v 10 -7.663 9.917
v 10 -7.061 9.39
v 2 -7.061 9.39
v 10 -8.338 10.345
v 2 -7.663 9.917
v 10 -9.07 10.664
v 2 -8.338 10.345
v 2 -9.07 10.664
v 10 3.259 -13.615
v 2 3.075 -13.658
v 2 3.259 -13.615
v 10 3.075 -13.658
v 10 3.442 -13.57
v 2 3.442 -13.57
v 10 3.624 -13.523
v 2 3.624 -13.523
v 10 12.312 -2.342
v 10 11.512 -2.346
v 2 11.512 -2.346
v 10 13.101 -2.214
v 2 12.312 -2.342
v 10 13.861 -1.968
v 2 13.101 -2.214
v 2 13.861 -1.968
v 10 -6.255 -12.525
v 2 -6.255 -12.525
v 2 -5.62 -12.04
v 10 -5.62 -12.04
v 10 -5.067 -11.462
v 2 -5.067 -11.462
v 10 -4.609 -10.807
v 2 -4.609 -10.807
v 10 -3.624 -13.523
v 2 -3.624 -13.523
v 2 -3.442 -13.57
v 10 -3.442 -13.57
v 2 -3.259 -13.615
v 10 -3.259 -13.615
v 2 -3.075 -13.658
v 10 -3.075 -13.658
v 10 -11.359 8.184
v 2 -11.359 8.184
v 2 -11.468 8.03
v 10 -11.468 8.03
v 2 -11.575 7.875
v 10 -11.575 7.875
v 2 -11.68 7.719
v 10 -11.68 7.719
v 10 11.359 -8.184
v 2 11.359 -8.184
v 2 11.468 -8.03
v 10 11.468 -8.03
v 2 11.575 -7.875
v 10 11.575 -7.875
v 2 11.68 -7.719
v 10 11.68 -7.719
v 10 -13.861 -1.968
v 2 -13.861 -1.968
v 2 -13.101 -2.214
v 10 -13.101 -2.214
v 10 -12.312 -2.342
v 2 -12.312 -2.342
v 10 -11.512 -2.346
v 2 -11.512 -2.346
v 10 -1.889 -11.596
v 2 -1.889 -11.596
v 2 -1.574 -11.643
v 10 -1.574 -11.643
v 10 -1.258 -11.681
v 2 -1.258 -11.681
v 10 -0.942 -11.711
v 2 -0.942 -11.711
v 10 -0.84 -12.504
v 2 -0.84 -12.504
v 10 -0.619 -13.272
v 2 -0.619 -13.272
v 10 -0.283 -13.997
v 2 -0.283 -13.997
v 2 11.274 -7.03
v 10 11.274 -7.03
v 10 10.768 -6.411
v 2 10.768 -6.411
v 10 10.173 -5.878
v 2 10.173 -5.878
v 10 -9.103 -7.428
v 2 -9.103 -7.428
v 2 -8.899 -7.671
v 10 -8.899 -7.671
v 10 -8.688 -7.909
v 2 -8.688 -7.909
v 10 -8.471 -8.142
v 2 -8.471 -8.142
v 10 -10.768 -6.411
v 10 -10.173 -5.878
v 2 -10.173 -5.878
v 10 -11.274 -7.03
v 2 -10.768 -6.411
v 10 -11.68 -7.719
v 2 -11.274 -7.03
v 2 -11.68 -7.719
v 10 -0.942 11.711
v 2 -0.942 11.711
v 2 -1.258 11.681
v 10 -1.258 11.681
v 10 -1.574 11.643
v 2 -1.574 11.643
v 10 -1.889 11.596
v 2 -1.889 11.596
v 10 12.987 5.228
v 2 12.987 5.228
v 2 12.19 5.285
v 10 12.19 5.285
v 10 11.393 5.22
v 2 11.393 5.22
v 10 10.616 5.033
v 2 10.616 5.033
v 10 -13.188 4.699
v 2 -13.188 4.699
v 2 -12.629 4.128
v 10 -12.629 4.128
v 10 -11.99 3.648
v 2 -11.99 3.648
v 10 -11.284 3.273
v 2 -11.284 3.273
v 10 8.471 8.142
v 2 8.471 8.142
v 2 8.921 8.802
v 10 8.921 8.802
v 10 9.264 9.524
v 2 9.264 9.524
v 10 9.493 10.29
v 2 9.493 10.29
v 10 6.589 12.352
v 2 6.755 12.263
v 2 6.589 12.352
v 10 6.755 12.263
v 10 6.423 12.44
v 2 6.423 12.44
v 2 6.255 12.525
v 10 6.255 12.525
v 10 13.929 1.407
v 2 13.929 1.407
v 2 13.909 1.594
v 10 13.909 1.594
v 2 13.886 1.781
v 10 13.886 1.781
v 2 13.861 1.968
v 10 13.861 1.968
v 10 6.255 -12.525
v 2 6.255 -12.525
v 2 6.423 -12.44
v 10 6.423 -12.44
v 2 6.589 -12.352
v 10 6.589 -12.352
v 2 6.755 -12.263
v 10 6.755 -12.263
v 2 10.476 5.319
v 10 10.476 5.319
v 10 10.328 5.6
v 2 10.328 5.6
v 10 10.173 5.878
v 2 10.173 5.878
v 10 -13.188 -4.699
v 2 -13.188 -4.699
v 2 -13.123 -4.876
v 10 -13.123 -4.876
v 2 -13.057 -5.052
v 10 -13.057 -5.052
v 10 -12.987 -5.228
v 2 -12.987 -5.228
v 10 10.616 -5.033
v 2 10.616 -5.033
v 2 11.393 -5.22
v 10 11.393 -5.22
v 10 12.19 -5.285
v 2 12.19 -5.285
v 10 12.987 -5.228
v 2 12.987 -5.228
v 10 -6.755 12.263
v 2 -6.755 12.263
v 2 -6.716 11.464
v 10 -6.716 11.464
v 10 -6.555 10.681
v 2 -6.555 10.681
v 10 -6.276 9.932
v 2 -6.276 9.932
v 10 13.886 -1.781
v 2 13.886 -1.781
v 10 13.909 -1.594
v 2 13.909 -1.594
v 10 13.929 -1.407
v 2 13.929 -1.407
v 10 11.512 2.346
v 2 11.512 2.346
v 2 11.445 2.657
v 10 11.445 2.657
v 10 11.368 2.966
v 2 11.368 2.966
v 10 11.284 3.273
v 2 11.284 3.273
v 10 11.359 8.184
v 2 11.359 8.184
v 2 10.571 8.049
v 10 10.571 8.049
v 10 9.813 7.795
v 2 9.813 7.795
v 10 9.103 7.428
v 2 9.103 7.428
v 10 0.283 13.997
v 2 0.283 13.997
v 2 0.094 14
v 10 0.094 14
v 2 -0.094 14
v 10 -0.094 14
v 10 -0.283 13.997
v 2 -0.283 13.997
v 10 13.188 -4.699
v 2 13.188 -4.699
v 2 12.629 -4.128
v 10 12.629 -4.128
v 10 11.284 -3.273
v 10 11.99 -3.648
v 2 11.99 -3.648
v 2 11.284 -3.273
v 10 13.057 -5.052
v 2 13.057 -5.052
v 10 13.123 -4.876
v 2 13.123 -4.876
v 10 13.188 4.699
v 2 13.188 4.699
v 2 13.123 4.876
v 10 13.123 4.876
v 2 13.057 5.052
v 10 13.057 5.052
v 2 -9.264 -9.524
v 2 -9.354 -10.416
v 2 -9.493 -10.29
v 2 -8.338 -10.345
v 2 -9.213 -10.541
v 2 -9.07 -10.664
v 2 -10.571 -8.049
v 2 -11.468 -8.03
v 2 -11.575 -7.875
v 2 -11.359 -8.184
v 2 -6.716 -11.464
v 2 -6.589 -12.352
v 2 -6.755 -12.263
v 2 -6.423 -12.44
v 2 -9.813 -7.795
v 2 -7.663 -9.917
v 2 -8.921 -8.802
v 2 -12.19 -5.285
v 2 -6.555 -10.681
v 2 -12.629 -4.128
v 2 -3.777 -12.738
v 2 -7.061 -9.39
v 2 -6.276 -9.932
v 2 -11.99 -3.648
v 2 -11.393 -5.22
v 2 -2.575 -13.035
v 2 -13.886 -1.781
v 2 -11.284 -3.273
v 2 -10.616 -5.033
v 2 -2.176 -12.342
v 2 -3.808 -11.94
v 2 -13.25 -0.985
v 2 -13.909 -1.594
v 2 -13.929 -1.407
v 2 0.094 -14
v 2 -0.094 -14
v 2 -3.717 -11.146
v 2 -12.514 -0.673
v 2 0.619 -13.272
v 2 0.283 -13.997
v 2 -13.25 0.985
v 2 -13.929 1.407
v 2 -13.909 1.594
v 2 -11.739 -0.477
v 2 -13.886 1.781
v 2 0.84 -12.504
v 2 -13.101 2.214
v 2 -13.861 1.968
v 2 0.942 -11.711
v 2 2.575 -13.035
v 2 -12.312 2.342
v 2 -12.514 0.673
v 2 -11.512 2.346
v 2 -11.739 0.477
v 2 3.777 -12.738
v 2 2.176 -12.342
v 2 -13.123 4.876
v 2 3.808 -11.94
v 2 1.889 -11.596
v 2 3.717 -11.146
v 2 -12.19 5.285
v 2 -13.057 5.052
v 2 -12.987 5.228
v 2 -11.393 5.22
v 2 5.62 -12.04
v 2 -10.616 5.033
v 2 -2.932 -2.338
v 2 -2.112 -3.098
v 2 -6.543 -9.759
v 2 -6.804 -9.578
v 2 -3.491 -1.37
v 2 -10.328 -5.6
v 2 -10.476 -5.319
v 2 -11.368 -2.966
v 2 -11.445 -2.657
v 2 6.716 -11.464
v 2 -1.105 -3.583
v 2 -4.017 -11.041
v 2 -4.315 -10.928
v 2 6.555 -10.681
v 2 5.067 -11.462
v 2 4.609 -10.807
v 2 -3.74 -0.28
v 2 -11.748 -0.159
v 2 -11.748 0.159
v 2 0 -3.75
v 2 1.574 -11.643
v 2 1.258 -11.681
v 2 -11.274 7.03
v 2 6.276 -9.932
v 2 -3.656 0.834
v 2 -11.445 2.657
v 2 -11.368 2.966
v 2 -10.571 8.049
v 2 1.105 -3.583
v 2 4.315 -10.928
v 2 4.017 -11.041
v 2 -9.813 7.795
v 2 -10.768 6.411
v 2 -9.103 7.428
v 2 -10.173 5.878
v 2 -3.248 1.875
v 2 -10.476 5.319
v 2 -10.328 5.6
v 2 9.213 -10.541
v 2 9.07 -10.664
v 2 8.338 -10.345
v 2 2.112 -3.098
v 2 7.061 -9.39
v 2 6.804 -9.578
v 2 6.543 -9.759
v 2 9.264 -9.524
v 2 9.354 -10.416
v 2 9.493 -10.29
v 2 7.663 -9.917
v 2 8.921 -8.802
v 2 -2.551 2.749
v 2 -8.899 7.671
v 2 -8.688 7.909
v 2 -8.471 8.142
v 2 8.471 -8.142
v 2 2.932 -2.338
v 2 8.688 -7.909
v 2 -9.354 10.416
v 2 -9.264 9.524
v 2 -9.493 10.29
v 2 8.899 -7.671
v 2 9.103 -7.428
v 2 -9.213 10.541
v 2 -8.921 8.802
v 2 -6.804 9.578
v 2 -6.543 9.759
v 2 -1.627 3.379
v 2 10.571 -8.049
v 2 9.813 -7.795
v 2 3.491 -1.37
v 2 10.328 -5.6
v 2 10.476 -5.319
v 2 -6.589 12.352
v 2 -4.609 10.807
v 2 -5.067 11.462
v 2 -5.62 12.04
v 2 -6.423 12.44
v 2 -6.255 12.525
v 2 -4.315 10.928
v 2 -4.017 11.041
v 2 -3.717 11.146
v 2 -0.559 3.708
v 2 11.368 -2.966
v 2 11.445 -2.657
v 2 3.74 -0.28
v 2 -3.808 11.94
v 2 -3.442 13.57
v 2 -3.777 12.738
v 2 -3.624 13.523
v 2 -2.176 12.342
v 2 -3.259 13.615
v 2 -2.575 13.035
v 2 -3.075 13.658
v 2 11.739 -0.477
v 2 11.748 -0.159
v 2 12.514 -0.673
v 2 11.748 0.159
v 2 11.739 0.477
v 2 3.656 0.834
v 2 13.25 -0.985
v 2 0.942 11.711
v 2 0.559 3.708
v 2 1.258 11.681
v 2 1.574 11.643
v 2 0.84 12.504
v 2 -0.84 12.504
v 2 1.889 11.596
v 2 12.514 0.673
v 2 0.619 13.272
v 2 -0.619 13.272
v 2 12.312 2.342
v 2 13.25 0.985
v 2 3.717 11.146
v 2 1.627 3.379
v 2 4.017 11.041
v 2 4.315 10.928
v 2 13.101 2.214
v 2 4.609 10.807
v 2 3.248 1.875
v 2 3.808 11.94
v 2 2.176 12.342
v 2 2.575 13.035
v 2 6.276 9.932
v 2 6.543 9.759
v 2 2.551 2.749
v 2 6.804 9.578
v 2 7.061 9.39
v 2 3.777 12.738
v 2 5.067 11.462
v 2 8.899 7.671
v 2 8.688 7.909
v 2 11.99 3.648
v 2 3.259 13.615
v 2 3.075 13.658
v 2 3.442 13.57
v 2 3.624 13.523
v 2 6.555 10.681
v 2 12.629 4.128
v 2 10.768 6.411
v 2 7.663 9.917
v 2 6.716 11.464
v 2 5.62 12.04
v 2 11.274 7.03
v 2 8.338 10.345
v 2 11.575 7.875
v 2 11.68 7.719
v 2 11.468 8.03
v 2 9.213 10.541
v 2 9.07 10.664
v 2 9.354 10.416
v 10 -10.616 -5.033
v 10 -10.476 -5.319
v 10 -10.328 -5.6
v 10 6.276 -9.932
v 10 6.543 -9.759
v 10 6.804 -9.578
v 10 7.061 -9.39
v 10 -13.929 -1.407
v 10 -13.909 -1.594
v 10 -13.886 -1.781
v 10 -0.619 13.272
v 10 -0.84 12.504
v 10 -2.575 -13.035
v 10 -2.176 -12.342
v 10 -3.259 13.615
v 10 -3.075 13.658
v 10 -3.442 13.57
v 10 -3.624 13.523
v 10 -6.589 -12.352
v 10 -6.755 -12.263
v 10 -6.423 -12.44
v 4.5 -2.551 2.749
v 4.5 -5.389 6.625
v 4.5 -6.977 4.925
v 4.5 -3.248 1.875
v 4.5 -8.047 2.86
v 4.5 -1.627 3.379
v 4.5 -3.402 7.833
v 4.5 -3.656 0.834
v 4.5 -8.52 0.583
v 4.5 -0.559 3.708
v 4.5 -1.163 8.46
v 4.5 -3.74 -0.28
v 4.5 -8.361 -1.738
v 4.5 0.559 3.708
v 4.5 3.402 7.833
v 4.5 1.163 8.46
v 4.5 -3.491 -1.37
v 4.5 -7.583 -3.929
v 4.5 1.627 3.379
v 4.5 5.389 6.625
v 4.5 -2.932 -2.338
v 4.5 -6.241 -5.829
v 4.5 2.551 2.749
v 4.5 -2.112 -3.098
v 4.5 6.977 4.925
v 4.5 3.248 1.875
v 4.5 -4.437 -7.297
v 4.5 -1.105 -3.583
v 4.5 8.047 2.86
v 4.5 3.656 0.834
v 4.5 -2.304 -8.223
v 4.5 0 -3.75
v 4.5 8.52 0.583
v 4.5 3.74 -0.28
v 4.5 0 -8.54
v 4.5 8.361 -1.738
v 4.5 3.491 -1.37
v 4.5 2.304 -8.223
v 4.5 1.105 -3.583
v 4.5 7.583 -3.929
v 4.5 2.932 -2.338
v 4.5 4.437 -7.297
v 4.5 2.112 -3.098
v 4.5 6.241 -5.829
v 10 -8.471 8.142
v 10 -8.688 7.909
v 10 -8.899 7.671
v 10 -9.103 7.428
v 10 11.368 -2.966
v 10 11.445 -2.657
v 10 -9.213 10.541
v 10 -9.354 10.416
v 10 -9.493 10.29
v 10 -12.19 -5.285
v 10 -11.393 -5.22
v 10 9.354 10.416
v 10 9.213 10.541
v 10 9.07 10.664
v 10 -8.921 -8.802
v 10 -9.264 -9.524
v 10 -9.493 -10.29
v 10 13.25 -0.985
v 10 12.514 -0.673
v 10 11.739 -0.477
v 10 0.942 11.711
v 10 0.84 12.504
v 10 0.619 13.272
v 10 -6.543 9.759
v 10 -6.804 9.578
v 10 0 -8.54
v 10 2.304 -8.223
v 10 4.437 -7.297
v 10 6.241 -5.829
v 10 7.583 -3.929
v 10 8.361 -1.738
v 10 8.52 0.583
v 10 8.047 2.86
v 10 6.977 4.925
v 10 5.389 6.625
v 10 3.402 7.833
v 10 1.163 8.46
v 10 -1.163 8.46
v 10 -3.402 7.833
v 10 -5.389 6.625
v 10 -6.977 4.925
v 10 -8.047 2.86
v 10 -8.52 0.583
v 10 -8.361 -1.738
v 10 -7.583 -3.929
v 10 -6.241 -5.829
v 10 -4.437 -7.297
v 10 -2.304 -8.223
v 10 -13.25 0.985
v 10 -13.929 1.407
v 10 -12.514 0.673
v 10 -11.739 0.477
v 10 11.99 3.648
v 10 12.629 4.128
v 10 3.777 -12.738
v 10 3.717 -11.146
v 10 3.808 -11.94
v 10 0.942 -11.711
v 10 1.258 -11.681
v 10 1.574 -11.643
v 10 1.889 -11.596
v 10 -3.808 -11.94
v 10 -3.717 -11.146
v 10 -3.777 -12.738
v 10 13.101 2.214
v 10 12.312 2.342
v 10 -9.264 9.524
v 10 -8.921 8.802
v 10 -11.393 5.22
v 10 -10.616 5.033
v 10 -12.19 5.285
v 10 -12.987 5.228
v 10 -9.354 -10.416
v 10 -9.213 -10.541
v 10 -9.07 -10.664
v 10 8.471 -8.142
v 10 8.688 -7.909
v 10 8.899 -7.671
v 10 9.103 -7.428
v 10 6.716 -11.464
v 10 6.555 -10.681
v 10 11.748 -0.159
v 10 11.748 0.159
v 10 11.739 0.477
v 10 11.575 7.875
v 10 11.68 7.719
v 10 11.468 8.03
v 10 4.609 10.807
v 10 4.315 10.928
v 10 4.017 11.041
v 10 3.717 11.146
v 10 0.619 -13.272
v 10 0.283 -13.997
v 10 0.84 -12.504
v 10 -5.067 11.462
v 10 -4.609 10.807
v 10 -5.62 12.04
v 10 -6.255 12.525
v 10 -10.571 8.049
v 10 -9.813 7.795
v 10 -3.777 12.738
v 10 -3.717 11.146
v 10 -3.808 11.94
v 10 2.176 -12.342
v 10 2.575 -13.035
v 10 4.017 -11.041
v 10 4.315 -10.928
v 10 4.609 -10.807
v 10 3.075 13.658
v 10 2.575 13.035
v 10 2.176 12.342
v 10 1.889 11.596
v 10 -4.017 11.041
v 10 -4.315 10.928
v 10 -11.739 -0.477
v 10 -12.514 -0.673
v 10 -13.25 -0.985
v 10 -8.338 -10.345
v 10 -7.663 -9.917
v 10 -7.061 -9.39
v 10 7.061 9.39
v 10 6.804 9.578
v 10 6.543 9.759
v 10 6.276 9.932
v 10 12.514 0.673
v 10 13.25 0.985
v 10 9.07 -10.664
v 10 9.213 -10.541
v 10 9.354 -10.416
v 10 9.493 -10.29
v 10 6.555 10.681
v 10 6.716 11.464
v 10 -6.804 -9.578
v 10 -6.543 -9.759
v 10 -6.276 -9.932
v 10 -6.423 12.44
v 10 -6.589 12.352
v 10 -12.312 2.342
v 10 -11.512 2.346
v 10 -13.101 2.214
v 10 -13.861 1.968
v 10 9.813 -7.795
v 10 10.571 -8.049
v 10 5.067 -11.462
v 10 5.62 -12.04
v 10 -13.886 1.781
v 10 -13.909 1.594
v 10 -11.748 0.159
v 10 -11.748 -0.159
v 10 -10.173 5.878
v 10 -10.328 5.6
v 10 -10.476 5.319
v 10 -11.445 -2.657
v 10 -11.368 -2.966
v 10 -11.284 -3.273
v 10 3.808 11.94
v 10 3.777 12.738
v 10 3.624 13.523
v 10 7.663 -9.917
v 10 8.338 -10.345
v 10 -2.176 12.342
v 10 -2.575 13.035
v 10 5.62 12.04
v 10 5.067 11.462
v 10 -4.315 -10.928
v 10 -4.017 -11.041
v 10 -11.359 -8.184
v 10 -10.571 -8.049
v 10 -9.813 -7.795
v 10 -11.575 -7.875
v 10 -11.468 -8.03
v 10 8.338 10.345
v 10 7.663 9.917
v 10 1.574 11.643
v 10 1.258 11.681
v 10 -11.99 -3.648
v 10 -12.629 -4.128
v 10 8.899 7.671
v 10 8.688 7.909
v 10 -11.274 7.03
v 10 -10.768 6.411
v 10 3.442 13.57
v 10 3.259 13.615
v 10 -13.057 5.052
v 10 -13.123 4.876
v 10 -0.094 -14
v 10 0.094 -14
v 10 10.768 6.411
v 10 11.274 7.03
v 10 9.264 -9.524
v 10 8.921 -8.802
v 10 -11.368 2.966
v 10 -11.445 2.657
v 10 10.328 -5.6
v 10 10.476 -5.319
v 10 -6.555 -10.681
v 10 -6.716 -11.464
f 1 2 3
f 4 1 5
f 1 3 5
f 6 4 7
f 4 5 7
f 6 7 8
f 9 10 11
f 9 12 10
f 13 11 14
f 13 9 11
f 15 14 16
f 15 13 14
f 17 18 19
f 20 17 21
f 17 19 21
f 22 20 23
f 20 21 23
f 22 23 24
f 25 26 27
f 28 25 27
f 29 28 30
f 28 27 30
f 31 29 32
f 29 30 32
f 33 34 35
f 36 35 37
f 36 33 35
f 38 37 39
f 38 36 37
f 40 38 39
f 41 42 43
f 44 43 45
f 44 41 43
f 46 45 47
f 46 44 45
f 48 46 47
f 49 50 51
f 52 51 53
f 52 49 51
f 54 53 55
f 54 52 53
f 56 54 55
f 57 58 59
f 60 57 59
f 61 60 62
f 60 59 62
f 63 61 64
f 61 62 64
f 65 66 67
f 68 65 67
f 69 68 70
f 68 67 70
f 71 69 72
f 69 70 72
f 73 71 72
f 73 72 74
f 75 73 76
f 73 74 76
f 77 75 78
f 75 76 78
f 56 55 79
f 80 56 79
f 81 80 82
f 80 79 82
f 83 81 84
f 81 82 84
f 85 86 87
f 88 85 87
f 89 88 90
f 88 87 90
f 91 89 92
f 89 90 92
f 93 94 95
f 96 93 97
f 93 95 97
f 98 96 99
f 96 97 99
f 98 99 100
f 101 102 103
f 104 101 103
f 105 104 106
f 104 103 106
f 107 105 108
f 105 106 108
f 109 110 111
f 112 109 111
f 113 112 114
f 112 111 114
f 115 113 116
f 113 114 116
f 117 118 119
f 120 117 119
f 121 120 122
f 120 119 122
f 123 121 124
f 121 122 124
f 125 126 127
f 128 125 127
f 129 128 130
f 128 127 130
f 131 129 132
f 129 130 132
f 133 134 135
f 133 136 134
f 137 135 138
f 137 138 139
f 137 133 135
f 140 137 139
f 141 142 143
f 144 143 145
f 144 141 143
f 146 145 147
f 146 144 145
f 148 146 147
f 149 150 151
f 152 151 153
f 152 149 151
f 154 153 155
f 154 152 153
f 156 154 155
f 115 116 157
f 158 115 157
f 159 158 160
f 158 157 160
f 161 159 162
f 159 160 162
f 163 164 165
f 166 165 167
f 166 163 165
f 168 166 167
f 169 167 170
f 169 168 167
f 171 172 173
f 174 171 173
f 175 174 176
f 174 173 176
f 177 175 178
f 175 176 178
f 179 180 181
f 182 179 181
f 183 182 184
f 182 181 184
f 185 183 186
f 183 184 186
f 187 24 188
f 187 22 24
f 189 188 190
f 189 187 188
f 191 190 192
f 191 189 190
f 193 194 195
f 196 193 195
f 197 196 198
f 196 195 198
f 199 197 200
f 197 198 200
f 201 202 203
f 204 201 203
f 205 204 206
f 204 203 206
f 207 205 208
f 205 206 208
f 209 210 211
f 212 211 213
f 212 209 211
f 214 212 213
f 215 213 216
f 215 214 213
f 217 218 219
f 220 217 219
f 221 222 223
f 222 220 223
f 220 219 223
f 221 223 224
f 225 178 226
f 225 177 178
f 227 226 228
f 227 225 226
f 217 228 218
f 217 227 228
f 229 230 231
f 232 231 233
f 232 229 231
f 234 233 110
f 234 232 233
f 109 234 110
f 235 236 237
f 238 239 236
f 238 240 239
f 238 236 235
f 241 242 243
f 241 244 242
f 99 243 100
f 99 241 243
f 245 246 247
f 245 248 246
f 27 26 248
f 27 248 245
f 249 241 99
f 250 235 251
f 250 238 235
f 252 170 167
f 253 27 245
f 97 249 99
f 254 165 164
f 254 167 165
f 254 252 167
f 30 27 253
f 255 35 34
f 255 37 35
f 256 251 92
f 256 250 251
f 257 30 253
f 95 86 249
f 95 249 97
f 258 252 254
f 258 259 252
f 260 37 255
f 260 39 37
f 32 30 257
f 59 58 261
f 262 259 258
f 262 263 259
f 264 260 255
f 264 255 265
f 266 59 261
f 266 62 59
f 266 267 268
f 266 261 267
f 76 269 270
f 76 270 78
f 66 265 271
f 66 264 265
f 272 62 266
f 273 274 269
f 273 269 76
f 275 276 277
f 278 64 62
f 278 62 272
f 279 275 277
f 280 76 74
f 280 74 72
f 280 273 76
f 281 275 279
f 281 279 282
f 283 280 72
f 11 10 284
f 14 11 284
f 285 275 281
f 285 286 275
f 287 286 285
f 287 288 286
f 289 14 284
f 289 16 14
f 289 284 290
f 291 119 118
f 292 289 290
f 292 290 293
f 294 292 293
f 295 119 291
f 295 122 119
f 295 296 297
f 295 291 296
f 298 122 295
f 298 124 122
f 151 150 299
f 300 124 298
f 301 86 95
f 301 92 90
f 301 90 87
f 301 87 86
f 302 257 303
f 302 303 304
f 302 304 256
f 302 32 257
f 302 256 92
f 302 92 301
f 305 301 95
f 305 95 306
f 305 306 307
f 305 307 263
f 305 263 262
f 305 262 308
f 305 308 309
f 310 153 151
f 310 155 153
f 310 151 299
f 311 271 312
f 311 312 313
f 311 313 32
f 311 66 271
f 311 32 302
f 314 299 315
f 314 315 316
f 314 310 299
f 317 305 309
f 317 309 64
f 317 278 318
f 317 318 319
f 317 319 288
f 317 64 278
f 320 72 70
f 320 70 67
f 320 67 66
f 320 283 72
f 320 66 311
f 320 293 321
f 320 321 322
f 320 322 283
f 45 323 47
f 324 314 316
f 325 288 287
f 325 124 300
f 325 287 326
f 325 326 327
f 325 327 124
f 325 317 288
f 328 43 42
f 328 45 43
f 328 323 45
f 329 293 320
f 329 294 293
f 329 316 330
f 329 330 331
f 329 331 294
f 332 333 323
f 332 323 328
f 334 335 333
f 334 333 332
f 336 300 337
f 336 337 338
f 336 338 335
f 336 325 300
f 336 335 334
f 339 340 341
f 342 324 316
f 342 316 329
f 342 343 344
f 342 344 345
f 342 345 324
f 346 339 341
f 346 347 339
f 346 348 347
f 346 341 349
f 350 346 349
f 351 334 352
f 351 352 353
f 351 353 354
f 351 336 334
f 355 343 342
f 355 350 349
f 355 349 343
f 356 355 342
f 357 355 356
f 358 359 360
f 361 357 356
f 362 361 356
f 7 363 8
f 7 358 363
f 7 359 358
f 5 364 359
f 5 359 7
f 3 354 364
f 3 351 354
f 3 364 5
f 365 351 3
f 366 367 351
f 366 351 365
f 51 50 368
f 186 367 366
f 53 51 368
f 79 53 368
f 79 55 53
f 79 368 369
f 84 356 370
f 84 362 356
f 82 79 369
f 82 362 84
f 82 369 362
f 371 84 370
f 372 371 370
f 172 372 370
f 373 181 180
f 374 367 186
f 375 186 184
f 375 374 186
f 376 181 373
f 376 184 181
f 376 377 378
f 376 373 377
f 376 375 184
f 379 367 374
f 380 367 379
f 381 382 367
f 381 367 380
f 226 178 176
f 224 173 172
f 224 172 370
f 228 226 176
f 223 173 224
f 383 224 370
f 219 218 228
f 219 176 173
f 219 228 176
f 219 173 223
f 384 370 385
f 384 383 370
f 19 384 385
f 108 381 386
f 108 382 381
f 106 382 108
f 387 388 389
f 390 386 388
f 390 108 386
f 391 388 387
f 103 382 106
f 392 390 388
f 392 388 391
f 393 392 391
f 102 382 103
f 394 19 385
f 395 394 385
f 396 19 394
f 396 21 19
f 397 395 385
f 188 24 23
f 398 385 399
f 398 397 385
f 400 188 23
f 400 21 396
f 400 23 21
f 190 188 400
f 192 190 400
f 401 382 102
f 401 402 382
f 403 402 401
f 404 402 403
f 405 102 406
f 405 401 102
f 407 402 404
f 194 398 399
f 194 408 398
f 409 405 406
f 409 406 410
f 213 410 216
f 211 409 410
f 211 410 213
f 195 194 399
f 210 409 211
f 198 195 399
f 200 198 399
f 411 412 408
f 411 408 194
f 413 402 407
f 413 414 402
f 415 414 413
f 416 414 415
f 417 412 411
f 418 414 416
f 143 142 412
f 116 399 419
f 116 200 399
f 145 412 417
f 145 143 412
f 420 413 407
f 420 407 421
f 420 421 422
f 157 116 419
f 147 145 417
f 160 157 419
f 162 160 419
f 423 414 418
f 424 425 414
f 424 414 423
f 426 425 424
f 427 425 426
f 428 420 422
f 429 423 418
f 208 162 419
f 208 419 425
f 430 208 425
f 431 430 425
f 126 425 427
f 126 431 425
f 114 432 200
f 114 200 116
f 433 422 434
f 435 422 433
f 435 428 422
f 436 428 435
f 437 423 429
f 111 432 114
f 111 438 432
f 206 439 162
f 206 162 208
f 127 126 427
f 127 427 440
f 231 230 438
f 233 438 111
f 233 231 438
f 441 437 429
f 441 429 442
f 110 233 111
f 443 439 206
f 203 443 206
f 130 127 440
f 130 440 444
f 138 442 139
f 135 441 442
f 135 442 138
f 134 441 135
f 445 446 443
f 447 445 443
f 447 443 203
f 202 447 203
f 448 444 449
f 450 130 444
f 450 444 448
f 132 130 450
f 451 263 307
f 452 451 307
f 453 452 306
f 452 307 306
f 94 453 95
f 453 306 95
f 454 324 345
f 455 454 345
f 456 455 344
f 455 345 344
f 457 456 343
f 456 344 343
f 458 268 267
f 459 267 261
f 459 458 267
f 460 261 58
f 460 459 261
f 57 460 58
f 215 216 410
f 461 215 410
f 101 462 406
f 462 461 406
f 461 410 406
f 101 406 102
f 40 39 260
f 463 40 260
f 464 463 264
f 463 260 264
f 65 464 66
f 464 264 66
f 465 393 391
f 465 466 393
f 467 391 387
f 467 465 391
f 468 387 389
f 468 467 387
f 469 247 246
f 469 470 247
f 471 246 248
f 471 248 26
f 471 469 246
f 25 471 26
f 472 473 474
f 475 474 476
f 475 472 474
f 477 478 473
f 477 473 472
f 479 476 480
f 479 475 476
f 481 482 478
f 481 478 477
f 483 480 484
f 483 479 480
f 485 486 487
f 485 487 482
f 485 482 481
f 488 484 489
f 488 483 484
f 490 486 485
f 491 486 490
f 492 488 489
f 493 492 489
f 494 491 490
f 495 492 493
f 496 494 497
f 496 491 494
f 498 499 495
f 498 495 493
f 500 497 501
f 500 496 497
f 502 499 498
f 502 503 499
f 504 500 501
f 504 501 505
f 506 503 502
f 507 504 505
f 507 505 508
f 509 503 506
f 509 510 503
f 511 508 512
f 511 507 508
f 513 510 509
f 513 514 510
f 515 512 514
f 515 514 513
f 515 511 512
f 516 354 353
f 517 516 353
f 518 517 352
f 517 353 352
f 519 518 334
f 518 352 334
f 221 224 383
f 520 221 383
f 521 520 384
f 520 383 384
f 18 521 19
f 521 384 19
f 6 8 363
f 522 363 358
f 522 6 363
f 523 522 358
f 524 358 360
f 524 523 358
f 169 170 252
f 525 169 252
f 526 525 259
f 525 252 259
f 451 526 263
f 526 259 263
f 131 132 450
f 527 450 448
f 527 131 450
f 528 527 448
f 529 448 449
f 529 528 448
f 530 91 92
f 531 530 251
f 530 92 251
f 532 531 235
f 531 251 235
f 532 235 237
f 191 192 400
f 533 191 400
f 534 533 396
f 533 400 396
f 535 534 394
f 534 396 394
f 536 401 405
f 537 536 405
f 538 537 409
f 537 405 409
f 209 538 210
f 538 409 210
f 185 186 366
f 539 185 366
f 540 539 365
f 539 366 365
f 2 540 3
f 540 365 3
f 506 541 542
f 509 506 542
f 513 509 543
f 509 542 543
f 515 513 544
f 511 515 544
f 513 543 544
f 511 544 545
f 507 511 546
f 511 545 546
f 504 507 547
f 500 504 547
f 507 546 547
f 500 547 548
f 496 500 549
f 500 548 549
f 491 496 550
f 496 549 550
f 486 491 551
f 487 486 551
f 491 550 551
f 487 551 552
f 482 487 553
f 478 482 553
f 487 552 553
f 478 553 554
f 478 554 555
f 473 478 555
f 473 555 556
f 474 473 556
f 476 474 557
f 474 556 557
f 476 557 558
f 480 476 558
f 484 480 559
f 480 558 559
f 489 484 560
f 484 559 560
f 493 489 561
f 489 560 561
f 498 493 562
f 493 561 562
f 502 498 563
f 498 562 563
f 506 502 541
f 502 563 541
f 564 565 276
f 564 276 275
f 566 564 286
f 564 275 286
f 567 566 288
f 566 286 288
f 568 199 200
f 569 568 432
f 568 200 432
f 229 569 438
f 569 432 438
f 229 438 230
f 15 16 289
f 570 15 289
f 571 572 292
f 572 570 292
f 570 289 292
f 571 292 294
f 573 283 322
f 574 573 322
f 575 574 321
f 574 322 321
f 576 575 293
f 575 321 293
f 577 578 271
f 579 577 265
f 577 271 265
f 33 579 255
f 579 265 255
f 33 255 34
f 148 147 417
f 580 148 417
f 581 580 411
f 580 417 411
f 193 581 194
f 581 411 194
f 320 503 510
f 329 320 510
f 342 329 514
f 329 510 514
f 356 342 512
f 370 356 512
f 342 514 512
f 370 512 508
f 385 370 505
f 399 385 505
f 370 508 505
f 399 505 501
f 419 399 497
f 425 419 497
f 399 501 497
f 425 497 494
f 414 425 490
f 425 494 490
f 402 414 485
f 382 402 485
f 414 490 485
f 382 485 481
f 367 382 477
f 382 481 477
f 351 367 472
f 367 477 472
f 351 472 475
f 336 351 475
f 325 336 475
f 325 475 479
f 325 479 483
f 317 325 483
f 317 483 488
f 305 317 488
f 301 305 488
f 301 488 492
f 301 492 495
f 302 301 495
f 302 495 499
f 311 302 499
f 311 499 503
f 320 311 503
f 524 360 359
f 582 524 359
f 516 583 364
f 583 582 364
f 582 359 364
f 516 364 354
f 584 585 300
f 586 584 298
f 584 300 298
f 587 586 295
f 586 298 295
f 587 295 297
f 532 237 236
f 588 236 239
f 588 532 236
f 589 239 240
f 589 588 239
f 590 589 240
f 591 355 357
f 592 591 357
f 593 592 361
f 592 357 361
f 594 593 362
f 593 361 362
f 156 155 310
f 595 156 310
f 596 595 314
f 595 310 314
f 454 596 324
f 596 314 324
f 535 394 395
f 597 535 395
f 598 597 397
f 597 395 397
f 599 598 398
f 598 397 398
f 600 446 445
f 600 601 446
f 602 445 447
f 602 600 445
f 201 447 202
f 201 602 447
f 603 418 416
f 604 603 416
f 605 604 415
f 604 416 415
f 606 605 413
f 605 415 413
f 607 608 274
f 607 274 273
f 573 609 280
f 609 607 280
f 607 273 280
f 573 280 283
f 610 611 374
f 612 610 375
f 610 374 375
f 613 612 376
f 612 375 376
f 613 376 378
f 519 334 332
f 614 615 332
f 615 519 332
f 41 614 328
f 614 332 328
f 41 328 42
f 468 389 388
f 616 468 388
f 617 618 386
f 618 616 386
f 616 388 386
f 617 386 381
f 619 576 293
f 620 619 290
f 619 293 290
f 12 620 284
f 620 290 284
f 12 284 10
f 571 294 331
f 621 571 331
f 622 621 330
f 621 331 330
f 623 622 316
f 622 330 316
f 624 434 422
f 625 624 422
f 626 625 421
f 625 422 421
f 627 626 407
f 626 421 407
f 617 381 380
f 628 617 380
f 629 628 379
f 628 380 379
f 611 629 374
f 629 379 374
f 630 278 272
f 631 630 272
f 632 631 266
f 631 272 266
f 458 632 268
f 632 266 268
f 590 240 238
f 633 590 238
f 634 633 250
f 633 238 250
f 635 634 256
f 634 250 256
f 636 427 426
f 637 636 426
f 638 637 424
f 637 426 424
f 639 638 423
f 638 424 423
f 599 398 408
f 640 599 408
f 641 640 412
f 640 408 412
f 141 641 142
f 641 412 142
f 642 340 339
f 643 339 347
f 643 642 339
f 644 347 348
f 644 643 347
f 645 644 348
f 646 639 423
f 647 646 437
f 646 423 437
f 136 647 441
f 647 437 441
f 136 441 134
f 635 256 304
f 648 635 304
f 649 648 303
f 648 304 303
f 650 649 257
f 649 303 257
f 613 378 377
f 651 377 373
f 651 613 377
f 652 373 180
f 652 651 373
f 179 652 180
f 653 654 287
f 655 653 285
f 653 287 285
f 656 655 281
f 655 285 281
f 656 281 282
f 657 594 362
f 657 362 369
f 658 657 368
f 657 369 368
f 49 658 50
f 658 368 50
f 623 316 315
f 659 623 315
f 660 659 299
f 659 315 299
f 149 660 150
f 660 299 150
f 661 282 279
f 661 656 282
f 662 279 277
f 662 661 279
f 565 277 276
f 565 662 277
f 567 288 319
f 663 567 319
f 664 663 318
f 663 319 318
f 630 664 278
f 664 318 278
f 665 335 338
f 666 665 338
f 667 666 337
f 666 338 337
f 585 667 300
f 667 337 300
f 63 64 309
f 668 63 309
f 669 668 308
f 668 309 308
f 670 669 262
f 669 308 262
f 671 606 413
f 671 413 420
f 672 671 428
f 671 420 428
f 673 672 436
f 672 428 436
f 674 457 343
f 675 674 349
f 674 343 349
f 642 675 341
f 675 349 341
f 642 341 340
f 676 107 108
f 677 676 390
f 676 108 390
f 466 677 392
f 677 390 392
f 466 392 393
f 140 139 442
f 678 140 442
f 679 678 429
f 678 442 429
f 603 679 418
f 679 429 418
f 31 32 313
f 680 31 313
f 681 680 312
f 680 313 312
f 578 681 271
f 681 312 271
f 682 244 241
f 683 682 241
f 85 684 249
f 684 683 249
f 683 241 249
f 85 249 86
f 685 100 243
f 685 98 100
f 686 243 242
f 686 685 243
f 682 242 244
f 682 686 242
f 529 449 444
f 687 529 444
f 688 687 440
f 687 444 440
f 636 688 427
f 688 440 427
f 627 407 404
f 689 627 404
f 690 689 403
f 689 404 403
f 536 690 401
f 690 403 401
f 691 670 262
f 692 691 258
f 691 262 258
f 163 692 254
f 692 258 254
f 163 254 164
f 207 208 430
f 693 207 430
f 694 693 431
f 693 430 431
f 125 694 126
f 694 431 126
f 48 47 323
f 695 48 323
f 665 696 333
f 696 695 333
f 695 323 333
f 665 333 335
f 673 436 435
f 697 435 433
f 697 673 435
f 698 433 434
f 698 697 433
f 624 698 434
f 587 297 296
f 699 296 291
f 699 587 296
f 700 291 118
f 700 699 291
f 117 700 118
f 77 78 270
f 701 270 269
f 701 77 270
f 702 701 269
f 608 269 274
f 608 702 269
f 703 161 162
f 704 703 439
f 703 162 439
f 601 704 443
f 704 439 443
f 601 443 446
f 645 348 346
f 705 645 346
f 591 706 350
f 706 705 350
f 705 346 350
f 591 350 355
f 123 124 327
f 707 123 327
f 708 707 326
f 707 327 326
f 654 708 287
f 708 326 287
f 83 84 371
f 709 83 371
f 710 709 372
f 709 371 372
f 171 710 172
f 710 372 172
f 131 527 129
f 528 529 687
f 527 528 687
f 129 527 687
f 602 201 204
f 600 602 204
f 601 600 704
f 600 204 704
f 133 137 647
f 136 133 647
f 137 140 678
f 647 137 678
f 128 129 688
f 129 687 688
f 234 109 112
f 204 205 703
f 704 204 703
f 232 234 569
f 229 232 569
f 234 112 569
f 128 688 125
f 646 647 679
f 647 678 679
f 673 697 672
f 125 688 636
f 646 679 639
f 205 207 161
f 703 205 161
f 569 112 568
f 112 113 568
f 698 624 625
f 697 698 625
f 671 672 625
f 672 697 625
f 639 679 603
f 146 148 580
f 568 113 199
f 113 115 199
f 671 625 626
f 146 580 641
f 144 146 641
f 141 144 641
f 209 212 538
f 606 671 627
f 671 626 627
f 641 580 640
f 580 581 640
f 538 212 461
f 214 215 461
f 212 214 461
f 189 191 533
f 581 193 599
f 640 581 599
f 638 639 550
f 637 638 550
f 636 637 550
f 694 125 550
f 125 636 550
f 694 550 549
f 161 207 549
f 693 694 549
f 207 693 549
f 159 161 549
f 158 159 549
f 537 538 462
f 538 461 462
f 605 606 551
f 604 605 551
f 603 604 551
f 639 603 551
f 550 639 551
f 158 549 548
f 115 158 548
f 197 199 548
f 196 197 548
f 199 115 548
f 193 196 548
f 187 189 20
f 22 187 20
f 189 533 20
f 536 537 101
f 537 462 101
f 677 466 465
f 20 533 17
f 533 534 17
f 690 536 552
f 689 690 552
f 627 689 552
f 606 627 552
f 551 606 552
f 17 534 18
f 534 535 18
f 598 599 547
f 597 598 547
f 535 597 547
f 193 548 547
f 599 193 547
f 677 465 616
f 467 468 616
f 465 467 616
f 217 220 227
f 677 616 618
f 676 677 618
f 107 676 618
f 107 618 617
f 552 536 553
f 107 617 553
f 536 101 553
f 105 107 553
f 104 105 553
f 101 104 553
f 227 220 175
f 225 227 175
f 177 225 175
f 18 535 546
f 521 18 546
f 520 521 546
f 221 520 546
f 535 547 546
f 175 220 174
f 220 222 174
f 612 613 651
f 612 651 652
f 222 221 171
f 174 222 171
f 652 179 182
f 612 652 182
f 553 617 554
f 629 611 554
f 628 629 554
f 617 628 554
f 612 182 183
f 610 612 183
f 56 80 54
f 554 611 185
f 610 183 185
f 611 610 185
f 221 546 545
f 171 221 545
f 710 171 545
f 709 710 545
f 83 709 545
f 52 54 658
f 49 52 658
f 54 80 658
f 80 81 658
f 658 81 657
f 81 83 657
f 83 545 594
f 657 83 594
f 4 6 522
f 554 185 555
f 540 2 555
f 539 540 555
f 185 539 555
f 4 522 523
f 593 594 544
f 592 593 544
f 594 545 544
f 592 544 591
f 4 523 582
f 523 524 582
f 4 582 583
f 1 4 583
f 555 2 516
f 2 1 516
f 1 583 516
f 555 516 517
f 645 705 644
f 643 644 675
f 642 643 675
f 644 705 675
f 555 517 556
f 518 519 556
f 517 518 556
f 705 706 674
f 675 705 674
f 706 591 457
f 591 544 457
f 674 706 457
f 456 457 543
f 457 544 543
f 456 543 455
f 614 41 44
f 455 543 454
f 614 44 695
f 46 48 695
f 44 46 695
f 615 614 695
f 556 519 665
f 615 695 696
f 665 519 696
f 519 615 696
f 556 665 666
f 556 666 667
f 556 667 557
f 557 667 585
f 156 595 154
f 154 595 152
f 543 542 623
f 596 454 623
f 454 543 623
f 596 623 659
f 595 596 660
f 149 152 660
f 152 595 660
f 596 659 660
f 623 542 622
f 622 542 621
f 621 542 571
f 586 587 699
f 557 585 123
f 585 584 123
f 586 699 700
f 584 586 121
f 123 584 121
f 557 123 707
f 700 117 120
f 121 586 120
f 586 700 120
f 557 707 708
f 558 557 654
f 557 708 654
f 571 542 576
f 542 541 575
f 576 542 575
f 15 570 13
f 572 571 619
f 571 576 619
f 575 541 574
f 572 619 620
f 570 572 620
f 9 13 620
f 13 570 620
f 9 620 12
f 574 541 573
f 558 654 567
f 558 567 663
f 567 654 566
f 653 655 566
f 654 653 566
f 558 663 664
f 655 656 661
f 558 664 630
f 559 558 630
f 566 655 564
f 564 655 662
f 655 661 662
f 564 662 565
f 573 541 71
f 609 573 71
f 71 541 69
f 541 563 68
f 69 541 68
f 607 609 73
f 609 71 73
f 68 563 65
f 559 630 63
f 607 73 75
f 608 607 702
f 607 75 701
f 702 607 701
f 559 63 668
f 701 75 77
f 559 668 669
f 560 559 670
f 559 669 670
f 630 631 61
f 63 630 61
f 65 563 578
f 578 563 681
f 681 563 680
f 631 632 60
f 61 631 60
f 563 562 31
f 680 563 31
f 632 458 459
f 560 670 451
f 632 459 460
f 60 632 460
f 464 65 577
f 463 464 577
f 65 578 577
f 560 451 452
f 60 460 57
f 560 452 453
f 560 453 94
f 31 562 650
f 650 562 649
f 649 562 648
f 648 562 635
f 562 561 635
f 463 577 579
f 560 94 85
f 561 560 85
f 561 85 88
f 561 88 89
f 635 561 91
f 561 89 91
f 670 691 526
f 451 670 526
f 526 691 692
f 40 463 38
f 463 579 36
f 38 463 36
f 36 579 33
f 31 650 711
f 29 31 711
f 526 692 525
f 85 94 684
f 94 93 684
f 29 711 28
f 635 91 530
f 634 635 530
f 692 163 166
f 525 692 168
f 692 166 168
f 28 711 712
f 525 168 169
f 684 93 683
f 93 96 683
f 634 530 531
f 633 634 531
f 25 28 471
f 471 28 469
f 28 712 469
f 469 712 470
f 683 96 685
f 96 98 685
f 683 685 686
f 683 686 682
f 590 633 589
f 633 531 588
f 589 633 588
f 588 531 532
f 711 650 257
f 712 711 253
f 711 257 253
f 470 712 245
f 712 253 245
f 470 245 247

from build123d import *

# Parameters (mm, degrees)
BASPROSKE_W        = 10
BASPROSKE_H        = 14
TOOTHCUT_DEPTH     = 23.181073013
TEETHCUTS_COUNT    = 26
TEETHCUTS_ANGLE    = 346.153846154
BORSKE_R           = 0.4
BORE_DEPTH         = 50.0000508
SKETCH1_R          = 8.54
CUT_EXTRUDE1_DEPTH = 5.5
SKETCH2_R          = 3.75
CUT_EXTRUDE2_DEPTH = 21.500522978
SKETCH3_R          = 15.294835459
CUT_EXTRUDE3_DEPTH = 2


with BuildPart() as part:
    # BasProSke → Base-Revolve (revolve)
    with BuildSketch(Plane(origin=(0, 0, 0), x_dir=(1, 0, 0), z_dir=(0, 1, 0)), mode=Mode.PRIVATE) as base_revolve_sk:
        with Locations((5, 7)):
            Rectangle(BASPROSKE_W, BASPROSKE_H)
    revolve(base_revolve_sk.sketch.rotate(Axis((-10, 0, 0), (1, 0, 0)), 180), axis=Axis((-10, 0, 0), (1, 0, 0)))

    # TooCutSke → ToothCut (cut, through all)
    with BuildSketch(Plane(origin=(0, 0, 0), x_dir=(0, 0, -1), z_dir=(1, 0, 0))):
        with BuildLine():
            ThreePointArc((0.476965065, 11.739314517), (0, 11.749), (-0.476965065, 11.739314517))
            ThreePointArc((-0.476965065, 11.739314517), (-0.82065865, 12.901686978), (-1.424117301, 13.952911348))
            ThreePointArc((-1.424117301, 13.952911348), (0, 14.0254), (1.424117301, 13.952911348))
            ThreePointArc((1.424117301, 13.952911348), (0.82065865, 12.901686978), (0.476965065, 11.739314517))
        make_face()
    toothcut = extrude(amount=TOOTHCUT_DEPTH, mode=Mode.SUBTRACT)

    # TeethCuts: ToothCut ×26 about axis
    teethcuts_axis = Axis((-10, 0, 0), (1, 0, 0))
    for i in range(1, TEETHCUTS_COUNT):
        add(toothcut.rotate(teethcuts_axis, i * TEETHCUTS_ANGLE / (TEETHCUTS_COUNT - 1)), mode=Mode.SUBTRACT)

    # BorSke → Bore (cut, symmetric)
    with BuildSketch(Plane(origin=(0, 0, 0), x_dir=(0, 0, -1), z_dir=(1, 0, 0))):
        with Locations(Location((0, 0, 0), (0, 0, 180))):
            Circle(BORSKE_R)
    extrude(amount=BORE_DEPTH, both=True, mode=Mode.SUBTRACT)

    # Sketch1 → Cut-Extrude1 (cut)
    with BuildSketch(Plane(origin=(10, 0, 0), x_dir=(0, 0, -1), z_dir=(1, 0, 0))):
        Circle(SKETCH1_R)
    extrude(amount=-CUT_EXTRUDE1_DEPTH, mode=Mode.SUBTRACT)

    # Sketch2 → Cut-Extrude2 (cut, through all)
    with BuildSketch(Plane(origin=(4.5, 0, 0), x_dir=(0, 0, -1), z_dir=(1, 0, 0))):
        Circle(SKETCH2_R)
    extrude(amount=-CUT_EXTRUDE2_DEPTH, mode=Mode.SUBTRACT)

    # Sketch3 → Cut-Extrude3 (cut)
    with BuildSketch(Plane.ZY):
        Circle(SKETCH3_R)
    extrude(amount=-CUT_EXTRUDE3_DEPTH, mode=Mode.SUBTRACT)


solid = part.part
